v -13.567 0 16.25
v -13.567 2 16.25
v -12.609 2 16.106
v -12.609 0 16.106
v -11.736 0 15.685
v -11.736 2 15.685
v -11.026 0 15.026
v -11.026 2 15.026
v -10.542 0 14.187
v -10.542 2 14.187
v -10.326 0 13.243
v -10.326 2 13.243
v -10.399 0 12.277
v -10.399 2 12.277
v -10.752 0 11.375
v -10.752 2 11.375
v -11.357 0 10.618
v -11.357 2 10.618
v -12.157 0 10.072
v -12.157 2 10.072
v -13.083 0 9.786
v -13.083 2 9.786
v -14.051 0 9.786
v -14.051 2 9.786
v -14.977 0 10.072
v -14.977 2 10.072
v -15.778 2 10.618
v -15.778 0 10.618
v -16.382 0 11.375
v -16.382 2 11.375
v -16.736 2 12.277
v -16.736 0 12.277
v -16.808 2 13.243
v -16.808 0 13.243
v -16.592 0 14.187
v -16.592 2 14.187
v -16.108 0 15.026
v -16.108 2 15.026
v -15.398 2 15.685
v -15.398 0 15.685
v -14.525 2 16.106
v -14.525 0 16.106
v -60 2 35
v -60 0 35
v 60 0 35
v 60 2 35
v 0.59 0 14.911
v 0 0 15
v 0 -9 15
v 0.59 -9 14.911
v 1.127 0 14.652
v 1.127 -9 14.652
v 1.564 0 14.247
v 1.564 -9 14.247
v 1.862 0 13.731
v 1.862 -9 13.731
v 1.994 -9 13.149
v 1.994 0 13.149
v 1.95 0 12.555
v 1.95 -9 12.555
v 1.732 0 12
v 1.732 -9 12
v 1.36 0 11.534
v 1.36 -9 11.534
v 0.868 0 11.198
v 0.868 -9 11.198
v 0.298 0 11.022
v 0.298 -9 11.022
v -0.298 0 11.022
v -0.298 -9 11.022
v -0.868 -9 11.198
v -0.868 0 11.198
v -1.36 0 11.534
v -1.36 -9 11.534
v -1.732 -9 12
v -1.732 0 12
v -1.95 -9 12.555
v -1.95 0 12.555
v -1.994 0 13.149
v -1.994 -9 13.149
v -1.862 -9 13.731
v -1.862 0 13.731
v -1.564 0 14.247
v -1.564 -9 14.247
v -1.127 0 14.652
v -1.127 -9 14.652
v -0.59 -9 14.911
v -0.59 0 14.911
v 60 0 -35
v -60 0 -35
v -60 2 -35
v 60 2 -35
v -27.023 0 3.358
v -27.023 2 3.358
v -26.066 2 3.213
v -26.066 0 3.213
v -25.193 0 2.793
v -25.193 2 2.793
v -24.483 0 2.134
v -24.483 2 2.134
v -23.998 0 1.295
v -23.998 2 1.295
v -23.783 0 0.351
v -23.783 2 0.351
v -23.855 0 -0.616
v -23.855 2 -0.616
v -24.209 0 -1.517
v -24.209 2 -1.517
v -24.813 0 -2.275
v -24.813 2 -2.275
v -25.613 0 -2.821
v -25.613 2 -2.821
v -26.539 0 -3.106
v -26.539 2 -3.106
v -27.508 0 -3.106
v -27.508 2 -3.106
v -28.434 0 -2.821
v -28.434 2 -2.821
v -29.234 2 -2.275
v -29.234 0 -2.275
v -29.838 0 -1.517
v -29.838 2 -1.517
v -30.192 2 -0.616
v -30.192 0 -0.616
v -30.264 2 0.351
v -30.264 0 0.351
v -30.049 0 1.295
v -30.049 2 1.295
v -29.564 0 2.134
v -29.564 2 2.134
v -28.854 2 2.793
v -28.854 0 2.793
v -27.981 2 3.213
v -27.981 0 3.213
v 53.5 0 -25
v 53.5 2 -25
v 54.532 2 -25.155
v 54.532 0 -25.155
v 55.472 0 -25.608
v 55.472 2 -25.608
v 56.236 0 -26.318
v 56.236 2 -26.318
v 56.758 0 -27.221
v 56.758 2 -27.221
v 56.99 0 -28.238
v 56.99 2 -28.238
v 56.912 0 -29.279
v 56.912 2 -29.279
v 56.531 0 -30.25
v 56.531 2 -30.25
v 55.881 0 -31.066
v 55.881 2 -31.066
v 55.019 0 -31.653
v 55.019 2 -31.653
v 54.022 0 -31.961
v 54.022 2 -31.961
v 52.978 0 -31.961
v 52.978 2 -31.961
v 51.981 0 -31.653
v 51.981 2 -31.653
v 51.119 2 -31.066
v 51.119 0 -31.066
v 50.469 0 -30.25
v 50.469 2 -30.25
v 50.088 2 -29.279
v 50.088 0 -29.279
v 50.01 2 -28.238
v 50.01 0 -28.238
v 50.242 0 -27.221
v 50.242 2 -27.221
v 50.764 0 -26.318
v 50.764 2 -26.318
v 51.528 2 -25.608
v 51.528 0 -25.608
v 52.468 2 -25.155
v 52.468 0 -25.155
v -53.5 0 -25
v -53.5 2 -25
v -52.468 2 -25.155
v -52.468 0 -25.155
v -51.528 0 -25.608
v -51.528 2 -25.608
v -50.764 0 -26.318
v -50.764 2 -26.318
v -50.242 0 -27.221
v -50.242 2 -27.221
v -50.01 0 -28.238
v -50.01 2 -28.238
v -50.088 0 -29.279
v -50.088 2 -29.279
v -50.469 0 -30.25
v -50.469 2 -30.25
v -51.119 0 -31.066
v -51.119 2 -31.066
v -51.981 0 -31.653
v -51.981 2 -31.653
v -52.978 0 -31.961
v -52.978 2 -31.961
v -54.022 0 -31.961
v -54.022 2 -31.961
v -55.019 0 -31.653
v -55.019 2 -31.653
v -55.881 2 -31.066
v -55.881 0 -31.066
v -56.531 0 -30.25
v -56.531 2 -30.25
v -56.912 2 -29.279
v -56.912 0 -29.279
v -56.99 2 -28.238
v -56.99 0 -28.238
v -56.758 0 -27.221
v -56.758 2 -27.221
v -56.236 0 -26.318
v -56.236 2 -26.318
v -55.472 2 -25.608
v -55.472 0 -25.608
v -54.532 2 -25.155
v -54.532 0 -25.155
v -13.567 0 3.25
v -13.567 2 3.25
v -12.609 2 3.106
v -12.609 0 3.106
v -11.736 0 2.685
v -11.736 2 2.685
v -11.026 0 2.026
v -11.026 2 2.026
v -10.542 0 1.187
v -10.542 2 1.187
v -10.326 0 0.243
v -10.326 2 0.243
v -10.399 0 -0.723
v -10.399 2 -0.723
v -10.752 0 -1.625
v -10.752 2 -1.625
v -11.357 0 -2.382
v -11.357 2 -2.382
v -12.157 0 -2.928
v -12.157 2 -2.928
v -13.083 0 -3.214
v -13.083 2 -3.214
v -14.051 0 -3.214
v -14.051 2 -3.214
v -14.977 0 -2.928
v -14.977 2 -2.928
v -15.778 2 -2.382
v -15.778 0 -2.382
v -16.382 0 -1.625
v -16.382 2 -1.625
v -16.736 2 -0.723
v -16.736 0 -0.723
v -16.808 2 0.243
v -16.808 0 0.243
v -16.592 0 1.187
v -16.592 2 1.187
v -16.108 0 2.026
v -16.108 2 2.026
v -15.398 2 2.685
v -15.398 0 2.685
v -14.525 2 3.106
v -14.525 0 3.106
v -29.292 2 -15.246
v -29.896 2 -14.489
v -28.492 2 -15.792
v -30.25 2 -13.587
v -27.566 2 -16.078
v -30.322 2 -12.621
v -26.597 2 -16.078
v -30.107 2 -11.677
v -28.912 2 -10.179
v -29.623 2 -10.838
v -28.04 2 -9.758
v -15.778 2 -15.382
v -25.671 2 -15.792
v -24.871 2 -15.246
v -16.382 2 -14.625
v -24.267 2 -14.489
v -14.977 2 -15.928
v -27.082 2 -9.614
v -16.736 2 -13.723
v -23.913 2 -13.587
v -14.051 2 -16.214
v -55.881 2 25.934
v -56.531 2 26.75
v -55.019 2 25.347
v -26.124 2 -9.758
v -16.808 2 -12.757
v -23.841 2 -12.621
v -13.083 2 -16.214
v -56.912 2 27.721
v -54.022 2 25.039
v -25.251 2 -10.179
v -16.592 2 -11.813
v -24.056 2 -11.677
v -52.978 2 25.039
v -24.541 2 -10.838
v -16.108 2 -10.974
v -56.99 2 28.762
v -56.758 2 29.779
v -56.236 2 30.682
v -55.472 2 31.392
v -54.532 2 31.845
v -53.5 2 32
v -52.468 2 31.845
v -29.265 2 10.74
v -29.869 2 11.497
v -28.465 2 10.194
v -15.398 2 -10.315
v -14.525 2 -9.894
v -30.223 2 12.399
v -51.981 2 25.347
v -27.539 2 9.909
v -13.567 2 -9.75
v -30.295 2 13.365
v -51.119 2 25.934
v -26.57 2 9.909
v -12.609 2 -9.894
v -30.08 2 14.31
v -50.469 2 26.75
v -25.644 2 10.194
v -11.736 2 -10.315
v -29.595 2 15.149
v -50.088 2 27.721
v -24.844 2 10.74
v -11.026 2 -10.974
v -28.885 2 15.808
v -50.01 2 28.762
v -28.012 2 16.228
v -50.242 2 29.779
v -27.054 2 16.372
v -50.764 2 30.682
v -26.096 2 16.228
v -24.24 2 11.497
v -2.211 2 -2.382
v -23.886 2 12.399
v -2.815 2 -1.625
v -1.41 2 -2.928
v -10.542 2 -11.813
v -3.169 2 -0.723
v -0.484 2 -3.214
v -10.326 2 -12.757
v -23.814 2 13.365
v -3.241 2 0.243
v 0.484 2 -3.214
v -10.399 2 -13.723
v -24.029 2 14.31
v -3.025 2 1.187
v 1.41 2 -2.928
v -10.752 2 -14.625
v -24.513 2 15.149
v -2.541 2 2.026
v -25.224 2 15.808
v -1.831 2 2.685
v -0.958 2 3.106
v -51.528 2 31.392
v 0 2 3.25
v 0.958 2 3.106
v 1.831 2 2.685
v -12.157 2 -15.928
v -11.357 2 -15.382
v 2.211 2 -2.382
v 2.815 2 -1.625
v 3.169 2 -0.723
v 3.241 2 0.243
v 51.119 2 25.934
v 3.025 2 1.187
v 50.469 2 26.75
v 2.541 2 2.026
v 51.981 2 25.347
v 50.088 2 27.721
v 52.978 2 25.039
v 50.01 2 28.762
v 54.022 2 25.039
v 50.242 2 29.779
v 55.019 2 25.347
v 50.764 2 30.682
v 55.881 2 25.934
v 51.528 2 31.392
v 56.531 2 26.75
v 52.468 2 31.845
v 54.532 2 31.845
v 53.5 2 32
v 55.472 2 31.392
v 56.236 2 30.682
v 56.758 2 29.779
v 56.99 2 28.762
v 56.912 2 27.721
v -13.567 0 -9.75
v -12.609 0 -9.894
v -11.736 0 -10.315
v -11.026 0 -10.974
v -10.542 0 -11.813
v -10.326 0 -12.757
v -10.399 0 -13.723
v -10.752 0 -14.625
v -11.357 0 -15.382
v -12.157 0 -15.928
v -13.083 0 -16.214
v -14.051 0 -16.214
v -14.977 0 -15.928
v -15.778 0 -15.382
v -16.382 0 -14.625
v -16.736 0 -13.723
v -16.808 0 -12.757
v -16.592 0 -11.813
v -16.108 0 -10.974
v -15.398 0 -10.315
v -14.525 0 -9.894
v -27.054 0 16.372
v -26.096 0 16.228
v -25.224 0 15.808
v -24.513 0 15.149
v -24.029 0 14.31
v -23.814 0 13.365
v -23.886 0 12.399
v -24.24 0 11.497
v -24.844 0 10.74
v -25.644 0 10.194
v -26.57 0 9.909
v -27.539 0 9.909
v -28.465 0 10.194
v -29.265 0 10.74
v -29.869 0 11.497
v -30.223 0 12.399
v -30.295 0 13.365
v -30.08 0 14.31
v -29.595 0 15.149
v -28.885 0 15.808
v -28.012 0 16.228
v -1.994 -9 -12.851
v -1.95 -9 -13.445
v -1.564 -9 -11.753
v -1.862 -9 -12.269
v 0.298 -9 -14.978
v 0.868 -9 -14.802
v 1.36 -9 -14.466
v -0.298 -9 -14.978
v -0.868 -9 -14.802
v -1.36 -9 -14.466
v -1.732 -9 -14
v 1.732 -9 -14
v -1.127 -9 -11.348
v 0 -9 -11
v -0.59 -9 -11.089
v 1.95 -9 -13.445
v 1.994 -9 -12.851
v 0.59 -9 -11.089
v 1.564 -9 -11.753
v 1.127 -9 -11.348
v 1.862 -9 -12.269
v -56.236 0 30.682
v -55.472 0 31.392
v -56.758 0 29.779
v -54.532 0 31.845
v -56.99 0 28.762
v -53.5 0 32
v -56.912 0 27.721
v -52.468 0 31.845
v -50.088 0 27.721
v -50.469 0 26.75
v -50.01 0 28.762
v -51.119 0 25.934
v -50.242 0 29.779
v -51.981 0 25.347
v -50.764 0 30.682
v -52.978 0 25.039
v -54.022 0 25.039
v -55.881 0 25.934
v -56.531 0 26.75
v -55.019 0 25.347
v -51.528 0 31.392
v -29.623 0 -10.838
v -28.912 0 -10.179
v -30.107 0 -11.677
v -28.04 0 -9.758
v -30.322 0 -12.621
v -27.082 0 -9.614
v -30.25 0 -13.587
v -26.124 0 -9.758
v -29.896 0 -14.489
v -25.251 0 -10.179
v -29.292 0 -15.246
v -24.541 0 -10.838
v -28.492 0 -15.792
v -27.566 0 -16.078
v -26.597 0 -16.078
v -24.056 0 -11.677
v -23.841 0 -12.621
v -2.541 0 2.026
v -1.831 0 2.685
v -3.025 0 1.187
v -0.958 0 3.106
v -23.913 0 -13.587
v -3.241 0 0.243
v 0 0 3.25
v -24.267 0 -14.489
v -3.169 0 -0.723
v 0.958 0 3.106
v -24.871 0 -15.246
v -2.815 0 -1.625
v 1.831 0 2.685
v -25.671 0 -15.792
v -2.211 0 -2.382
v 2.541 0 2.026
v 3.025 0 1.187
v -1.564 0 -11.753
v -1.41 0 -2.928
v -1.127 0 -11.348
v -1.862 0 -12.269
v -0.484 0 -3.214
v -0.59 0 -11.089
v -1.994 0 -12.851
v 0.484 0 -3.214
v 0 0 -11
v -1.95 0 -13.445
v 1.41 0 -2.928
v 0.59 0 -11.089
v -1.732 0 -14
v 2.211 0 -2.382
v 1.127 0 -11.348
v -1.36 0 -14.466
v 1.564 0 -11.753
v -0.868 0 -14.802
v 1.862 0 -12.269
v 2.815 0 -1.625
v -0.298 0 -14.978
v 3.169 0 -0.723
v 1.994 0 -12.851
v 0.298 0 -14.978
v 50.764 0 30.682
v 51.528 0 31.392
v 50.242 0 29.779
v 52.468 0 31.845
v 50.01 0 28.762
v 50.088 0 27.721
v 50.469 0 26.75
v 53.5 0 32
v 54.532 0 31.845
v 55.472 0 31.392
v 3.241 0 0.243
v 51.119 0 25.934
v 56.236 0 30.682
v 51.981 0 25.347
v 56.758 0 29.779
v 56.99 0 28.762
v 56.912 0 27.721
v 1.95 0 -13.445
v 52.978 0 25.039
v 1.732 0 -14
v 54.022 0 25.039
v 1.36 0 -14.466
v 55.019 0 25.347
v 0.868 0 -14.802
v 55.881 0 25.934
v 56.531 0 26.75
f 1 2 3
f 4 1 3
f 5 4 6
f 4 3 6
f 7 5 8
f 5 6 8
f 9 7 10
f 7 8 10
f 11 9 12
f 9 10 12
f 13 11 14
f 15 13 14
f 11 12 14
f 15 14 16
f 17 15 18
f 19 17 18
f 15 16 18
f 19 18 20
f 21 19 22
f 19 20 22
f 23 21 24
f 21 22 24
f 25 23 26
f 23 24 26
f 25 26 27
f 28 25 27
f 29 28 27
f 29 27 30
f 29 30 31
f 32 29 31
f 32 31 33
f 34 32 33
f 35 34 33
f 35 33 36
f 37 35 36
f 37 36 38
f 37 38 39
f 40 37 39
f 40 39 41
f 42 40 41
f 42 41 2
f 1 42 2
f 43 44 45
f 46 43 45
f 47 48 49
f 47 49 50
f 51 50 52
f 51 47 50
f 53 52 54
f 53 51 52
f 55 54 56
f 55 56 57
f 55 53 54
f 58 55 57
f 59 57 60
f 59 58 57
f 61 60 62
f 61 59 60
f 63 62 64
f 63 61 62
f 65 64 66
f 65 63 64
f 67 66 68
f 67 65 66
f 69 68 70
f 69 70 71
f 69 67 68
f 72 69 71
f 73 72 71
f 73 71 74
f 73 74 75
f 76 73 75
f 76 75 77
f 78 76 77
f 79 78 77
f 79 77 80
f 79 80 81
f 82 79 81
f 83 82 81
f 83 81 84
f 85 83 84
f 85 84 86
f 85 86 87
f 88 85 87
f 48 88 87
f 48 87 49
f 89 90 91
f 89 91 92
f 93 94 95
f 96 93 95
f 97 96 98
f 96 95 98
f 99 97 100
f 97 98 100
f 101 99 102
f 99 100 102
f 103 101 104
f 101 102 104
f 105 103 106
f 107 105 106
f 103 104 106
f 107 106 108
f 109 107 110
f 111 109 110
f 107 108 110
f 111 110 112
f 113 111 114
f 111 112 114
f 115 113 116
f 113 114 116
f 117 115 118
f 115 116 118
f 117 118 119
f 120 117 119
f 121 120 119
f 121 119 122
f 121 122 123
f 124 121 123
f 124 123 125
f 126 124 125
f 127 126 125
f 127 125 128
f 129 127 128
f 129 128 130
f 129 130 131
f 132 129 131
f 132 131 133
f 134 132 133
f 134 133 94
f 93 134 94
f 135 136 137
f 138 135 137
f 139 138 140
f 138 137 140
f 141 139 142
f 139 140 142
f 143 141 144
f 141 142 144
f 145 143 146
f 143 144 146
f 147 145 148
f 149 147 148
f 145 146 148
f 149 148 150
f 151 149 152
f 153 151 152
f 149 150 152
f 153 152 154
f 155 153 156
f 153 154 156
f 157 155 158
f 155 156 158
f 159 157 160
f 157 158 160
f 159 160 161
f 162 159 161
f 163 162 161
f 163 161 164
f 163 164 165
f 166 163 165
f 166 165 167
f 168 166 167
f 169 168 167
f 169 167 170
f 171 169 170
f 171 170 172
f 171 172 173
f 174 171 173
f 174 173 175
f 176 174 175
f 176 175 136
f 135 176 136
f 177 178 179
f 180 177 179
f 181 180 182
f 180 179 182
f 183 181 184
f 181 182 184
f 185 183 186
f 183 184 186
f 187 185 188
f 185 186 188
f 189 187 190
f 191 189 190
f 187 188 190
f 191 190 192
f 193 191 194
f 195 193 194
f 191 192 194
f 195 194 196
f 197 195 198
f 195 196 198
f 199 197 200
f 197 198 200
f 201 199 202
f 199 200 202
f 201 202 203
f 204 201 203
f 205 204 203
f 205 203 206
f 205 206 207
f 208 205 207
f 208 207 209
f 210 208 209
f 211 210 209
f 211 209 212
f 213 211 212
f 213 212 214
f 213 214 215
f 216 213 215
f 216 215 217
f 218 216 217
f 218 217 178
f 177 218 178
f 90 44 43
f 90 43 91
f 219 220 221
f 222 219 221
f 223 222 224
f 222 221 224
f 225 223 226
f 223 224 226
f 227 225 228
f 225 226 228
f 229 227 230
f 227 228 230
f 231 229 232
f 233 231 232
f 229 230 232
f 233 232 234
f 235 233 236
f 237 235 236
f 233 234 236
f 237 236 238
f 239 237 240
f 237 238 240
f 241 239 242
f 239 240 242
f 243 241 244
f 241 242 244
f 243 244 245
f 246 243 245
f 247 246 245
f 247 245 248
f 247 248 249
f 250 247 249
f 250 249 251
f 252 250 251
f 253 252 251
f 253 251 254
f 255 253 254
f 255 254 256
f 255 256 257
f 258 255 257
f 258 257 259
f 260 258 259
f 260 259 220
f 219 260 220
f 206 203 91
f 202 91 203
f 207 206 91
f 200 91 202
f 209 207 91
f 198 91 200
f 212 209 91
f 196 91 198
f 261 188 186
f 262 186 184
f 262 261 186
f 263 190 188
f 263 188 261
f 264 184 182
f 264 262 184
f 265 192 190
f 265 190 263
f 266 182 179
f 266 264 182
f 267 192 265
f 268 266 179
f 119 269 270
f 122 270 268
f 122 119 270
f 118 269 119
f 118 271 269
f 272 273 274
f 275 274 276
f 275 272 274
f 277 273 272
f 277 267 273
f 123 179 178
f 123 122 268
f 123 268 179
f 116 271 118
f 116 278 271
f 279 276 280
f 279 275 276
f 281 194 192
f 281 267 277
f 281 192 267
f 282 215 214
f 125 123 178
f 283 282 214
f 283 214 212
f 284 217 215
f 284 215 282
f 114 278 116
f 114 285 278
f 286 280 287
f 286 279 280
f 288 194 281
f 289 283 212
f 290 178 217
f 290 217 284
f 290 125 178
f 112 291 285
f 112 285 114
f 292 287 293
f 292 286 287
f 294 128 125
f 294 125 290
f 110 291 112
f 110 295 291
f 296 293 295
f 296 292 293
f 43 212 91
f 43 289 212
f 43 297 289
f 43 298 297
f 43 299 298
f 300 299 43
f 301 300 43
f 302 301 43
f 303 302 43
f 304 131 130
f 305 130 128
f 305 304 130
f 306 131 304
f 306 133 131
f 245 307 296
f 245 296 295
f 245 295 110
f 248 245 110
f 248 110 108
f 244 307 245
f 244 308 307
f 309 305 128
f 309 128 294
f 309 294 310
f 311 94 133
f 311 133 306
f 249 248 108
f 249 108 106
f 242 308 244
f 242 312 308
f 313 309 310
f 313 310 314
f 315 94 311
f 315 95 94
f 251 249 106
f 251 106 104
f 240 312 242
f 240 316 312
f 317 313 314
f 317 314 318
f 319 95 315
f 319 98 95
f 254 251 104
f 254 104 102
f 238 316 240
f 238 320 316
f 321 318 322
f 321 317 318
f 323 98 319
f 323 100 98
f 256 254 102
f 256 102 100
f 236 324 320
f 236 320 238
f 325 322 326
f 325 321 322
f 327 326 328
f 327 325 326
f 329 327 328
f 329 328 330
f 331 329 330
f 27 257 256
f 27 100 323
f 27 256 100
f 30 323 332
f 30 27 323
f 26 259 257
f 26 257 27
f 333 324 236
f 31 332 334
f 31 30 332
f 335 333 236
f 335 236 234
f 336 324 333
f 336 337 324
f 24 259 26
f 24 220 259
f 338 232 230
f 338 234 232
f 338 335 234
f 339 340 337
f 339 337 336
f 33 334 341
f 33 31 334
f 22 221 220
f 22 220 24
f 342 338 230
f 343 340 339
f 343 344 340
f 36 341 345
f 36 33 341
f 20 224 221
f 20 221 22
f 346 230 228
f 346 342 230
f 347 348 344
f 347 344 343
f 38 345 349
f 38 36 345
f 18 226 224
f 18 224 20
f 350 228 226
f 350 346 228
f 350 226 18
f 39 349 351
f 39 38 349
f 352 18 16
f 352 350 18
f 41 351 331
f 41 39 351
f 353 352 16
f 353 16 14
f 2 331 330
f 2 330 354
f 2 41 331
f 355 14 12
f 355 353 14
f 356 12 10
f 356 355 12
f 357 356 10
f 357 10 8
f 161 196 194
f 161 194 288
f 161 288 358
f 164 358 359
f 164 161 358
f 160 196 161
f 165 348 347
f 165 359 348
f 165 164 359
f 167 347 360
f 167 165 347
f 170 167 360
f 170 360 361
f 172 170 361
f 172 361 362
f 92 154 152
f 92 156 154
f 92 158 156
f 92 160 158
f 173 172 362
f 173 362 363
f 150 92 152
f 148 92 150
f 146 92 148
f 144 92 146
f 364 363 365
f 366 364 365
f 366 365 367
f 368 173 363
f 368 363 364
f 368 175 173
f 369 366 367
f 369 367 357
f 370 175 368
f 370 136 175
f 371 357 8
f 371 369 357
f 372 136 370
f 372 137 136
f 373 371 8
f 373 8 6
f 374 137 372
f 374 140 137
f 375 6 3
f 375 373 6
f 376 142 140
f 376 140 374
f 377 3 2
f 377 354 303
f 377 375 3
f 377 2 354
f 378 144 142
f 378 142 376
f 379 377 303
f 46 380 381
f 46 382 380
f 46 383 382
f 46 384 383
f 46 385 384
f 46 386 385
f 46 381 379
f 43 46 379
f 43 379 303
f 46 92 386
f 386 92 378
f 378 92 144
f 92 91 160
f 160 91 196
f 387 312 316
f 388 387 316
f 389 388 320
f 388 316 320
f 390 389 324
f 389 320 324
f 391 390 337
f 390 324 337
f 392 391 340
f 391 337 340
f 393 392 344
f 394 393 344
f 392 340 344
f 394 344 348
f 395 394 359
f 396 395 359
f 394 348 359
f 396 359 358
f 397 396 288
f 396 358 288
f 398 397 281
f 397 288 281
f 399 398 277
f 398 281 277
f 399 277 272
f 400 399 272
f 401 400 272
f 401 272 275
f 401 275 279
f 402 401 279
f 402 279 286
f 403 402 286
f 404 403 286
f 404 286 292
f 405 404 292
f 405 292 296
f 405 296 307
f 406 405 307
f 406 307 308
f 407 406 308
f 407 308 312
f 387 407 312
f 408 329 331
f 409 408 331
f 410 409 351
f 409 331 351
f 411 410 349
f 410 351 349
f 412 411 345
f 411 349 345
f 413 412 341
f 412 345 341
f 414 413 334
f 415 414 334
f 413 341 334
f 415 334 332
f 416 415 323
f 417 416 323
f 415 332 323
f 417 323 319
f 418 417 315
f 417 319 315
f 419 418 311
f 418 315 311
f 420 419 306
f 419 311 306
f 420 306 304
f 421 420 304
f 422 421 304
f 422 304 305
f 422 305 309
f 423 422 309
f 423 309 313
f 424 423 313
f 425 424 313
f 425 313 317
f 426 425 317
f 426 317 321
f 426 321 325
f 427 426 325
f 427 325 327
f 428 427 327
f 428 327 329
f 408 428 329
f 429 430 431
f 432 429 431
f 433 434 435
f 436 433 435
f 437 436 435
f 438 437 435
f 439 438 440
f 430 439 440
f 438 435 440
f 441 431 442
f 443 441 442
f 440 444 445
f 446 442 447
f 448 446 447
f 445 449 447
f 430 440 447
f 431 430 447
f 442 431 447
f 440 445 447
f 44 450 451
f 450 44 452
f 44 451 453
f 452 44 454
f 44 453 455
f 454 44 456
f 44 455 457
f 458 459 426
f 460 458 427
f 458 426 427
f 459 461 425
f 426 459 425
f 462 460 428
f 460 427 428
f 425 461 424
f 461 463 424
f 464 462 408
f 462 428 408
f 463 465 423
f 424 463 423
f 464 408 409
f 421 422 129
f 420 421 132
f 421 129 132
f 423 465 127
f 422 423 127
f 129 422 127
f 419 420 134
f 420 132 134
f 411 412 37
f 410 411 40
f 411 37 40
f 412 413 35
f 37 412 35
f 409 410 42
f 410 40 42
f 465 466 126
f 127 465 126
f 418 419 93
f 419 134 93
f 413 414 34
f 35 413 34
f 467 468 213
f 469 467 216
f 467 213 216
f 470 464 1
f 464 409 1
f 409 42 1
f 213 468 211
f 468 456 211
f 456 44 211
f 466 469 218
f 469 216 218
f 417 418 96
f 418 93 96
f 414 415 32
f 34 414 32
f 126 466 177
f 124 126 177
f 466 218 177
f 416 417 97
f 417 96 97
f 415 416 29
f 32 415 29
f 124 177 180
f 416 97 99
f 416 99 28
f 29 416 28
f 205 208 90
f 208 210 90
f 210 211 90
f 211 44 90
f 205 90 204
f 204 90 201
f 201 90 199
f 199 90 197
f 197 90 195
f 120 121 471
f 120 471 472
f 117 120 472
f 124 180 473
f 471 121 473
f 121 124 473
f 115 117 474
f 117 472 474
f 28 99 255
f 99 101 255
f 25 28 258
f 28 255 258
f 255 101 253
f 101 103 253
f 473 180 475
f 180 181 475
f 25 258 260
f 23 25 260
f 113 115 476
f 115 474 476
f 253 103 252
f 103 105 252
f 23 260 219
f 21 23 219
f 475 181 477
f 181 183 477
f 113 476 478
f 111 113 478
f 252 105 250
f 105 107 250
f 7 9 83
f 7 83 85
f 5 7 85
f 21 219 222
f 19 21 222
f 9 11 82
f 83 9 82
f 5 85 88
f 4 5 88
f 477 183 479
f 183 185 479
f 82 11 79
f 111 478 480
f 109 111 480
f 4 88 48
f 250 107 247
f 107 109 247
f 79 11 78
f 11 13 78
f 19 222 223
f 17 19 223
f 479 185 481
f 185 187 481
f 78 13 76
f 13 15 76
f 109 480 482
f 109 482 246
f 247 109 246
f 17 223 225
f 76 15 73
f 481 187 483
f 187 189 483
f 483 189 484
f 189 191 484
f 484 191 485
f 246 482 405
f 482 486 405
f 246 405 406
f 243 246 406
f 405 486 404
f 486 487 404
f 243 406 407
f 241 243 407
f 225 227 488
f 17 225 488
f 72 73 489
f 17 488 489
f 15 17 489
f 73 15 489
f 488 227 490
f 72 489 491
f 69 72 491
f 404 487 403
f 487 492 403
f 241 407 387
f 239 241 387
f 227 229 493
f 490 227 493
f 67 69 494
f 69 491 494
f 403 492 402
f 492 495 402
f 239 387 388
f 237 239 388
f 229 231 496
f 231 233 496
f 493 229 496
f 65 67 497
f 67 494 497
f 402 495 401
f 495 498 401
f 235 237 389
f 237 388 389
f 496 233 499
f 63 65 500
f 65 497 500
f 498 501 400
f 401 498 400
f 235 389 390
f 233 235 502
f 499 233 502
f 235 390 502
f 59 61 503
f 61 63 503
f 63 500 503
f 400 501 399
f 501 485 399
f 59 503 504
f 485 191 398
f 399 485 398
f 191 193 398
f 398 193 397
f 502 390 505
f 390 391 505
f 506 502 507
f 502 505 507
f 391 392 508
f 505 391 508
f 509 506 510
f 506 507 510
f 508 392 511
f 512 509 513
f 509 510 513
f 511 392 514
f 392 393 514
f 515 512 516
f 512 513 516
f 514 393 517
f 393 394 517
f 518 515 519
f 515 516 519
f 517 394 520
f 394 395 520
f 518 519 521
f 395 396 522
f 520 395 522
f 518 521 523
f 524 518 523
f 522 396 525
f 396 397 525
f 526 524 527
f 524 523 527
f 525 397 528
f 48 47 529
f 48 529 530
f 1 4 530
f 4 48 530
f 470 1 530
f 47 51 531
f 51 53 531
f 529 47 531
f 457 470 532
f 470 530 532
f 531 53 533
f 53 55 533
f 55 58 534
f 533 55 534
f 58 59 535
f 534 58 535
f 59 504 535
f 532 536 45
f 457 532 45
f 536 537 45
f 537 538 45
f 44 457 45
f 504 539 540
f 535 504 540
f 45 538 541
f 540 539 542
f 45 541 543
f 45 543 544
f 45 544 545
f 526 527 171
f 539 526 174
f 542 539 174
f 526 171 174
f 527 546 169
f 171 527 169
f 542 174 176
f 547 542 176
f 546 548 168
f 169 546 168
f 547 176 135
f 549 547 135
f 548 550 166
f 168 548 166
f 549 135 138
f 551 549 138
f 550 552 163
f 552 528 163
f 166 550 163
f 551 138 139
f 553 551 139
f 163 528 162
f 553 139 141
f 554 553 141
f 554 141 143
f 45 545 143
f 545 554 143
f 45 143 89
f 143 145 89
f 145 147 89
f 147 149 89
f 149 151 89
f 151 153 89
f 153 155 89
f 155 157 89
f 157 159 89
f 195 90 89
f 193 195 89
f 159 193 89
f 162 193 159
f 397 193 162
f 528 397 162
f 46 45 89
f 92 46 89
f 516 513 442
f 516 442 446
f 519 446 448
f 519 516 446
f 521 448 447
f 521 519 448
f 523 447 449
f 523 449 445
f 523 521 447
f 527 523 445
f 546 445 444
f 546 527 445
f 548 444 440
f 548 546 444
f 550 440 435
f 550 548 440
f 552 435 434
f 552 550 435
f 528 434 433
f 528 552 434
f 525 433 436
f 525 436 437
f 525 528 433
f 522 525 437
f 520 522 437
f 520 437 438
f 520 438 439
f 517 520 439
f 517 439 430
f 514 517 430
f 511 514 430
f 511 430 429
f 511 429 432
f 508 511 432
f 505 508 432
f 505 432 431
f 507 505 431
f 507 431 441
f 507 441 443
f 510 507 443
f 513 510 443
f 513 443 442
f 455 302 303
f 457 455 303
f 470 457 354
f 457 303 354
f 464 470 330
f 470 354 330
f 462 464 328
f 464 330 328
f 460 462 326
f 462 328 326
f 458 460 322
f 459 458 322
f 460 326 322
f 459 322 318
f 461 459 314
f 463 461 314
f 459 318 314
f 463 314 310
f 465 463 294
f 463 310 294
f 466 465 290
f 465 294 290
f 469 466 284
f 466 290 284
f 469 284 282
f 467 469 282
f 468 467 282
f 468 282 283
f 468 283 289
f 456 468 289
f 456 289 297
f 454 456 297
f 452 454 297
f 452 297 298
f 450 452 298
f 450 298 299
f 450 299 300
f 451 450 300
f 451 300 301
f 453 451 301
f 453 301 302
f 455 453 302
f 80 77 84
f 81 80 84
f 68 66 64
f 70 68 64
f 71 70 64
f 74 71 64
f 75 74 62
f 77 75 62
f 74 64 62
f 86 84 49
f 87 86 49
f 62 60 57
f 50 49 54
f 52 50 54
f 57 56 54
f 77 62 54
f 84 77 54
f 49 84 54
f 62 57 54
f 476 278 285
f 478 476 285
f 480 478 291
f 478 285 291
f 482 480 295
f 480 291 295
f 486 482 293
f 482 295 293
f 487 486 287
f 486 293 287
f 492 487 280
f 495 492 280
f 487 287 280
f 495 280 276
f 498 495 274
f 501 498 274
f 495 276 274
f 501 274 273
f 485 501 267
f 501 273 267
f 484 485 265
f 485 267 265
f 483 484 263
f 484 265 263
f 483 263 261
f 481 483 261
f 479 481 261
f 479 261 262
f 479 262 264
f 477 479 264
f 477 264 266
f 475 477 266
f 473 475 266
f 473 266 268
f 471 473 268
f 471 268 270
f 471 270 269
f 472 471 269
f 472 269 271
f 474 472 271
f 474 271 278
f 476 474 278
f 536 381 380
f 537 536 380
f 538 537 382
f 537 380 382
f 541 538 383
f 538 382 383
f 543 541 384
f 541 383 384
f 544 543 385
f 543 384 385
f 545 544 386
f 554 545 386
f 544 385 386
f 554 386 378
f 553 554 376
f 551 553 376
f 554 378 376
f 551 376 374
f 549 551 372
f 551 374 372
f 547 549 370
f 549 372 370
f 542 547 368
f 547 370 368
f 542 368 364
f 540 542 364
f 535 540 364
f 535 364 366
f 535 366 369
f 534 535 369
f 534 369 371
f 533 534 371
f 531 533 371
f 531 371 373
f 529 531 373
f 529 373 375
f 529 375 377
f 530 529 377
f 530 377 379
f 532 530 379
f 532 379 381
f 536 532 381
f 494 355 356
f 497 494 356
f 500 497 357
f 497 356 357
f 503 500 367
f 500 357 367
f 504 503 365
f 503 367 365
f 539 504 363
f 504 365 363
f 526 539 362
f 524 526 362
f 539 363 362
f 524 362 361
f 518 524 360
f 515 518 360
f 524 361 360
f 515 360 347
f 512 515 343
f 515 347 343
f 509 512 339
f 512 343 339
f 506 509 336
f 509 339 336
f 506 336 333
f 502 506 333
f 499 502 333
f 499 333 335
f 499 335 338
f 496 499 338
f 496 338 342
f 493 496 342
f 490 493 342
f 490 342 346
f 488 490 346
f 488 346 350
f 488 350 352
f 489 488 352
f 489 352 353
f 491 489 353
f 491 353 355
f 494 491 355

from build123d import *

# Parameters (mm, degrees)
SKETCH1_W           = 120
SKETCH1_H           = 70
BOSS_EXTRUDE1_DEPTH = 2
SKETCH3_R           = 3.5
CUT_EXTRUDE1_DEPTH  = 3
SKETCH6_R           = 2
BOSS_EXTRUDE2_DEPTH = 11
SKETCH4_R           = 3.25
CUT_EXTRUDE2_DEPTH  = 11


with BuildPart() as part:
    # Sketch1 → Boss-Extrude1 (new body)
    with BuildSketch(Plane(origin=(0, 0, 0), x_dir=(1, 0, 0), z_dir=(0, 1, 0))):
        Rectangle(SKETCH1_W, SKETCH1_H)
    extrude(amount=BOSS_EXTRUDE1_DEPTH)

    # Sketch3 → Cut-Extrude1 (cut)
    with BuildSketch(Plane(origin=(0, 2, 0), x_dir=(1, 0, 0), z_dir=(0, 1, 0))):
        with Locations(Location((-53.5, 28.5, 0), (0, 0, 270))):
            Circle(SKETCH3_R)
        with Locations(Location((53.5, 28.5, 0), (0, 0, 270))):
            Circle(SKETCH3_R)
        with Locations(Location((-53.5, -28.5, 0), (0, 0, 270))):
            Circle(SKETCH3_R)
        with Locations(Location((53.5, -28.5, 0), (0, 0, 270))):
            Circle(SKETCH3_R)
    extrude(amount=-CUT_EXTRUDE1_DEPTH, mode=Mode.SUBTRACT)

    # Sketch6 → Boss-Extrude2 (add)
    with BuildSketch(Plane(origin=(0, 2, 0), x_dir=(1, 0, 0), z_dir=(0, 1, 0))):
        with Locations(Location((0, -13, 0), (0, 0, 270))):
            Circle(SKETCH6_R)
        with Locations(Location((0, 13, 0), (0, 0, 270))):
            Circle(SKETCH6_R)
    extrude(amount=-BOSS_EXTRUDE2_DEPTH)

    # Sketch4 → Cut-Extrude2 (cut)
    with BuildSketch(Plane(origin=(0, 2, 0), x_dir=(1, 0, 0), z_dir=(0, 1, 0))):
        with Locations(Location((-27.054448087, -13.122273409, 0), (0, 0, 270))):
            Circle(SKETCH4_R)
        with Locations(Location((-27.023483048, -0.10764713, 0), (0, 0, 270))):
            Circle(SKETCH4_R)
        with Locations(Location((-27.081562274, 12.864019897, 0), (0, 0, 270))):
            Circle(SKETCH4_R)
        with Locations(Location((-13.567081484, 0, 0), (0, 0, 270))):
            Circle(SKETCH4_R)
        with Locations(Location((-13.567081484, -13, 0), (0, 0, 270))):
            Circle(SKETCH4_R)
        with Locations(Location((-13.567081484, 13, 0), (0, 0, 270))):
            Circle(SKETCH4_R)
        with Locations(Location((0, 0, 0), (0, 0, 270))):
            Circle(SKETCH4_R)
    extrude(amount=-CUT_EXTRUDE2_DEPTH, mode=Mode.SUBTRACT)


solid = part.part
